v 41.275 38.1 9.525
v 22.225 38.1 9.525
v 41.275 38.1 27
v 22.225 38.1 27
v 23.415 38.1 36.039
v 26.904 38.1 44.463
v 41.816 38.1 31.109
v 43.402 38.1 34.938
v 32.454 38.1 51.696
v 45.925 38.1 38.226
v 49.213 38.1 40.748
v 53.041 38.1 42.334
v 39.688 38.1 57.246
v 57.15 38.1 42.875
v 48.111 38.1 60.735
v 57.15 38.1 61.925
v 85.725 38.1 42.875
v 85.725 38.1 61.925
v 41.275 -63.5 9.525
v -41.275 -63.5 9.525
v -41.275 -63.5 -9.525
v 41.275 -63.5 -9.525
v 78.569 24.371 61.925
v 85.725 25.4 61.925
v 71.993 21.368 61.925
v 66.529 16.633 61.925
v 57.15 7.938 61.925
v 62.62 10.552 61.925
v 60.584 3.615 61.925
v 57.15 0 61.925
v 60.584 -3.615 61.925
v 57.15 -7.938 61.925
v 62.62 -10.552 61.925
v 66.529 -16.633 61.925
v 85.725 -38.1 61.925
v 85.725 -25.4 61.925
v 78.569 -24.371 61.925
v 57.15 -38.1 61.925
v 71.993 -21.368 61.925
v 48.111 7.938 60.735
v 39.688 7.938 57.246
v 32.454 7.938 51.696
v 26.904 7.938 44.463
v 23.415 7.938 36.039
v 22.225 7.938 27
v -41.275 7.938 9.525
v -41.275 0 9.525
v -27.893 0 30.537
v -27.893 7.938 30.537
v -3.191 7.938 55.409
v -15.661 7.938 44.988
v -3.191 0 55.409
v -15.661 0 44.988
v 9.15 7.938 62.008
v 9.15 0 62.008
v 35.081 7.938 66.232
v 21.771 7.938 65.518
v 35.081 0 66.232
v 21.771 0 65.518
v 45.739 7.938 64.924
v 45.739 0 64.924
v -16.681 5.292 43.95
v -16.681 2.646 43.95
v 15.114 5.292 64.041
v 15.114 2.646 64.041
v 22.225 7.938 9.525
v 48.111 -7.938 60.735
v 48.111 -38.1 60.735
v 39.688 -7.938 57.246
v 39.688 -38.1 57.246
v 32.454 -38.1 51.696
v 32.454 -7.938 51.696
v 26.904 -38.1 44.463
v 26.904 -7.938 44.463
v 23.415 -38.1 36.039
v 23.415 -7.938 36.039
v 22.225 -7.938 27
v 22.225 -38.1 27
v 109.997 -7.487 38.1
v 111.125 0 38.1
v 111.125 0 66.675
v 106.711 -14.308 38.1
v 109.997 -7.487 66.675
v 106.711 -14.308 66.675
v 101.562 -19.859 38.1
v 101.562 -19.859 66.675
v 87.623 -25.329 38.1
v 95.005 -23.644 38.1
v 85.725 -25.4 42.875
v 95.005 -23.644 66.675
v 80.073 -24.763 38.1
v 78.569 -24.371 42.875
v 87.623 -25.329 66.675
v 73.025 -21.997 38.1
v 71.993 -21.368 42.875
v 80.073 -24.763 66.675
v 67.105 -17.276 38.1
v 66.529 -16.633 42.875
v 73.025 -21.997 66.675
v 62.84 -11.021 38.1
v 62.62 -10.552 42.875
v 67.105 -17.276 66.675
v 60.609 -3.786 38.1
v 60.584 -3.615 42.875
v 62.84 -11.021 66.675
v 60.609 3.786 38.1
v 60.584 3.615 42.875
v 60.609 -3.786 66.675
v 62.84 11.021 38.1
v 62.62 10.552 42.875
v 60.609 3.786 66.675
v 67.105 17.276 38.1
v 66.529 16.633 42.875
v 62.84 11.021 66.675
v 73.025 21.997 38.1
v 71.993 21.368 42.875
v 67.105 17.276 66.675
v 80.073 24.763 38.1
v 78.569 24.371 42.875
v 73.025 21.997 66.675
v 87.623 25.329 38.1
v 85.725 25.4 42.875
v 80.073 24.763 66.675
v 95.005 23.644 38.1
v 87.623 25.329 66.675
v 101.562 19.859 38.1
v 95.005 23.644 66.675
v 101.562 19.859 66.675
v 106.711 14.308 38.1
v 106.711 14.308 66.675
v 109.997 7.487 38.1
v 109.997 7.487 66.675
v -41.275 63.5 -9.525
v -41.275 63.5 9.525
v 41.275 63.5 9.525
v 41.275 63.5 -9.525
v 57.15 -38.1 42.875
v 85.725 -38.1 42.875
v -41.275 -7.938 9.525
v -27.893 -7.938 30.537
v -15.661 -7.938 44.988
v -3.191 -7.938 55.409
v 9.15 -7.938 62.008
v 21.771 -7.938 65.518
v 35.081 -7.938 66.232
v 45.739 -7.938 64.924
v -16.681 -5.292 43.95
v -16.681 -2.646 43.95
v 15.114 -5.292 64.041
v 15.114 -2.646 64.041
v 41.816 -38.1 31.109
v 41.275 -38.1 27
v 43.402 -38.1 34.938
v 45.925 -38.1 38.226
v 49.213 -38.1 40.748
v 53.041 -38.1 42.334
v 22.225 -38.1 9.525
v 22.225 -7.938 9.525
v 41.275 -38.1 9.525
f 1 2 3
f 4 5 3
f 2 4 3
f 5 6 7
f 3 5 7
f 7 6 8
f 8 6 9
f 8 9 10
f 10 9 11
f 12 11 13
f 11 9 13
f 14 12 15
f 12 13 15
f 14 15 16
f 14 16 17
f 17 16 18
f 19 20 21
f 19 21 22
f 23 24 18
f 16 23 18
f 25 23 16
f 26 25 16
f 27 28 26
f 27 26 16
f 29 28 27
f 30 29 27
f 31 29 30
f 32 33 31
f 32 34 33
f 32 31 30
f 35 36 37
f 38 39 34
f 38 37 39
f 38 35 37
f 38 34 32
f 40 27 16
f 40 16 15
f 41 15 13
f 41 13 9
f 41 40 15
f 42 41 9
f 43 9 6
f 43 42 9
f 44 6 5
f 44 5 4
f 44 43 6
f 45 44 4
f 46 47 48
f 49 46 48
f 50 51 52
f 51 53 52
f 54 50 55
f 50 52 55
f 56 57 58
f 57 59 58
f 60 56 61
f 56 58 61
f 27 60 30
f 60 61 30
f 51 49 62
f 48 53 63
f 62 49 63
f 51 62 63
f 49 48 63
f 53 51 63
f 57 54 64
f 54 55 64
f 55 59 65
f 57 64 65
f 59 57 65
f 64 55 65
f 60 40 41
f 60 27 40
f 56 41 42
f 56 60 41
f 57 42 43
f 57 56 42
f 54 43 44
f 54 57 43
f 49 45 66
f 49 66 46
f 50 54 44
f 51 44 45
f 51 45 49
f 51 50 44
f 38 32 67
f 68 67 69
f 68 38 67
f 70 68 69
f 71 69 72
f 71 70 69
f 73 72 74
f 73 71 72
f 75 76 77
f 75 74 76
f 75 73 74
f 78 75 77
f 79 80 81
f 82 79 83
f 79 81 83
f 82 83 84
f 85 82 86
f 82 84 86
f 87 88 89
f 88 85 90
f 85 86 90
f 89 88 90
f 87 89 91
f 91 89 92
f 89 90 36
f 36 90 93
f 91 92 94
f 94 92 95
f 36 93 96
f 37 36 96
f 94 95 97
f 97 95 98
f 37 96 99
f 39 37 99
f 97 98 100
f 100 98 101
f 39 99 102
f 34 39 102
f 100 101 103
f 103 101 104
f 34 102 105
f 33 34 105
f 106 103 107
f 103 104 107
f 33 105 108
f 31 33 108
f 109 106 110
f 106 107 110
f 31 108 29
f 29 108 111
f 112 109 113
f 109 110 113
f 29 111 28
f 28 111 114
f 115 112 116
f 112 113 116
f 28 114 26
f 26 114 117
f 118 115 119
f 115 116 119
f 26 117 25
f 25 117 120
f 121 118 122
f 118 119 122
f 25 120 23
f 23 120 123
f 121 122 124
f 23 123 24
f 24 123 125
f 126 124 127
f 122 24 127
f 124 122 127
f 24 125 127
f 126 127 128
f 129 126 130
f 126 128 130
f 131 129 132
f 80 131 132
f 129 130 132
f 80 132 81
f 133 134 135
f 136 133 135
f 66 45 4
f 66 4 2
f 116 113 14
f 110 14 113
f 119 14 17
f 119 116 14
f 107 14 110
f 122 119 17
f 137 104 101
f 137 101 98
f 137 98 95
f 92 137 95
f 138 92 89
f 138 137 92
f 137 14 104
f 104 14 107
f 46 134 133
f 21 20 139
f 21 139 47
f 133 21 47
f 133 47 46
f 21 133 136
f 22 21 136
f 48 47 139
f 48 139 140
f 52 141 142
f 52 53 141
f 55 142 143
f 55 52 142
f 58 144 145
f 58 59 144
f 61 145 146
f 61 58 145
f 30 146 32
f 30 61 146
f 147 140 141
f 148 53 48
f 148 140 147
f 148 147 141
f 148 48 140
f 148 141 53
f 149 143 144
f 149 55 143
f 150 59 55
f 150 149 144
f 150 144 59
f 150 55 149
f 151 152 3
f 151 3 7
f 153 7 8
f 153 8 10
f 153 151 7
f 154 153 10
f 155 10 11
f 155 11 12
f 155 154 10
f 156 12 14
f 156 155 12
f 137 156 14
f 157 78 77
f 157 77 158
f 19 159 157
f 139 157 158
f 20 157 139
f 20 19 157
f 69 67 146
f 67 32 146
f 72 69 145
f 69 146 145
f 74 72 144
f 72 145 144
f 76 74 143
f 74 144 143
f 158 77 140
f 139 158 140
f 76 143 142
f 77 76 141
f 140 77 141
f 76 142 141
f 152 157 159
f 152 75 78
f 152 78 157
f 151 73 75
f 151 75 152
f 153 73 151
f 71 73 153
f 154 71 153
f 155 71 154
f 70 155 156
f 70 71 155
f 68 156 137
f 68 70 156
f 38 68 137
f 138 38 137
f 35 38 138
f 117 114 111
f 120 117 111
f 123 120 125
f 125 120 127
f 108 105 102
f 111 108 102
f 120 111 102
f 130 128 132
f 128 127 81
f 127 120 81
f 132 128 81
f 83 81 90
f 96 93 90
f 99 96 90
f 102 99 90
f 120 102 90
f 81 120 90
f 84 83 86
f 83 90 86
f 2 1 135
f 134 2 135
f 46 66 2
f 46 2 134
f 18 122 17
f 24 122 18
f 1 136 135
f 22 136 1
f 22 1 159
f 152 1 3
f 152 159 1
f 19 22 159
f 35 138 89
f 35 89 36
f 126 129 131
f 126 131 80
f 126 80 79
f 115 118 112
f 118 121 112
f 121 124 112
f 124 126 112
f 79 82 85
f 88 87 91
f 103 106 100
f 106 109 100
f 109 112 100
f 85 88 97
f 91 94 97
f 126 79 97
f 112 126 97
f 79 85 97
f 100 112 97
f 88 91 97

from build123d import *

# Parameters (mm, degrees)
F1_DEPTH = 63.5
F2_DEPTH = 7.9375
F0_W     = 25.4
F0_H     = 19.05
F3_DEPTH = 38.1


with BuildPart() as f1:
    # F0 (on Front) → F1 (new body, symmetric)
    with BuildSketch(Plane.XZ):
        Polygon((-41.275, 9.525), (-41.275, -9.525), (41.275, -9.525), (41.275, 9.525), (22.225, 9.525), align=None)
    extrude(amount=F1_DEPTH, both=True)

    # F0 (on Front) → F2 (join, symmetric)
    with BuildSketch(Plane.XZ):
        with BuildLine():
            add(Edge.make_bspline(
                [(-41.275, 9.525), (-19.269418, 48.490915), (8.980925, 77.770598), (57.15, 61.9252)],
                knots=[0, 0, 0, 0, 111.504536, 111.504536, 111.504536, 111.504536], degree=3))
            Line((-41.275, 9.525), (22.225, 9.525))
            Line((22.225, 9.525), (22.225, 27.0002))
            ThreePointArc((22.225, 27.0002), (32.454296, 51.695904), (57.15, 61.9252))
        make_face()
    extrude(amount=F2_DEPTH, both=True)

    # F0 (on Front) → F3 (join, symmetric)
    with BuildSketch(Plane.XZ):
        with BuildLine():
            Line((22.225, 9.525), (41.275, 9.525))
            Line((41.275, 9.525), (41.275, 27.0002))
            ThreePointArc((41.275, 27.0002), (45.92468, 38.22552), (57.15, 42.8752))
            Line((57.15, 42.8752), (60.325, 42.8752))
            Line((60.325, 42.8752), (60.325, 61.9252))
            Line((60.325, 61.9252), (57.15, 61.9252))
            ThreePointArc((57.15, 61.9252), (32.454296, 51.695904), (22.225, 27.0002))
            Line((22.225, 27.0002), (22.225, 9.525))
        make_face()
        with Locations((73.025, 52.4002)):
            Rectangle(F0_W, F0_H)
    extrude(amount=F3_DEPTH, both=True)

    # F0 (on Front) → F4 (revolve)
    with BuildSketch(Plane.XZ):
        Polygon((85.725, 66.675), (85.725, 61.9252), (85.725, 42.8752), (85.725, 38.1), (111.125, 38.1), (111.125, 66.675), align=None)
    revolve(axis=Axis((85.725, 0, 52.4002), (0, 0, -1)))


solid = f1.part
